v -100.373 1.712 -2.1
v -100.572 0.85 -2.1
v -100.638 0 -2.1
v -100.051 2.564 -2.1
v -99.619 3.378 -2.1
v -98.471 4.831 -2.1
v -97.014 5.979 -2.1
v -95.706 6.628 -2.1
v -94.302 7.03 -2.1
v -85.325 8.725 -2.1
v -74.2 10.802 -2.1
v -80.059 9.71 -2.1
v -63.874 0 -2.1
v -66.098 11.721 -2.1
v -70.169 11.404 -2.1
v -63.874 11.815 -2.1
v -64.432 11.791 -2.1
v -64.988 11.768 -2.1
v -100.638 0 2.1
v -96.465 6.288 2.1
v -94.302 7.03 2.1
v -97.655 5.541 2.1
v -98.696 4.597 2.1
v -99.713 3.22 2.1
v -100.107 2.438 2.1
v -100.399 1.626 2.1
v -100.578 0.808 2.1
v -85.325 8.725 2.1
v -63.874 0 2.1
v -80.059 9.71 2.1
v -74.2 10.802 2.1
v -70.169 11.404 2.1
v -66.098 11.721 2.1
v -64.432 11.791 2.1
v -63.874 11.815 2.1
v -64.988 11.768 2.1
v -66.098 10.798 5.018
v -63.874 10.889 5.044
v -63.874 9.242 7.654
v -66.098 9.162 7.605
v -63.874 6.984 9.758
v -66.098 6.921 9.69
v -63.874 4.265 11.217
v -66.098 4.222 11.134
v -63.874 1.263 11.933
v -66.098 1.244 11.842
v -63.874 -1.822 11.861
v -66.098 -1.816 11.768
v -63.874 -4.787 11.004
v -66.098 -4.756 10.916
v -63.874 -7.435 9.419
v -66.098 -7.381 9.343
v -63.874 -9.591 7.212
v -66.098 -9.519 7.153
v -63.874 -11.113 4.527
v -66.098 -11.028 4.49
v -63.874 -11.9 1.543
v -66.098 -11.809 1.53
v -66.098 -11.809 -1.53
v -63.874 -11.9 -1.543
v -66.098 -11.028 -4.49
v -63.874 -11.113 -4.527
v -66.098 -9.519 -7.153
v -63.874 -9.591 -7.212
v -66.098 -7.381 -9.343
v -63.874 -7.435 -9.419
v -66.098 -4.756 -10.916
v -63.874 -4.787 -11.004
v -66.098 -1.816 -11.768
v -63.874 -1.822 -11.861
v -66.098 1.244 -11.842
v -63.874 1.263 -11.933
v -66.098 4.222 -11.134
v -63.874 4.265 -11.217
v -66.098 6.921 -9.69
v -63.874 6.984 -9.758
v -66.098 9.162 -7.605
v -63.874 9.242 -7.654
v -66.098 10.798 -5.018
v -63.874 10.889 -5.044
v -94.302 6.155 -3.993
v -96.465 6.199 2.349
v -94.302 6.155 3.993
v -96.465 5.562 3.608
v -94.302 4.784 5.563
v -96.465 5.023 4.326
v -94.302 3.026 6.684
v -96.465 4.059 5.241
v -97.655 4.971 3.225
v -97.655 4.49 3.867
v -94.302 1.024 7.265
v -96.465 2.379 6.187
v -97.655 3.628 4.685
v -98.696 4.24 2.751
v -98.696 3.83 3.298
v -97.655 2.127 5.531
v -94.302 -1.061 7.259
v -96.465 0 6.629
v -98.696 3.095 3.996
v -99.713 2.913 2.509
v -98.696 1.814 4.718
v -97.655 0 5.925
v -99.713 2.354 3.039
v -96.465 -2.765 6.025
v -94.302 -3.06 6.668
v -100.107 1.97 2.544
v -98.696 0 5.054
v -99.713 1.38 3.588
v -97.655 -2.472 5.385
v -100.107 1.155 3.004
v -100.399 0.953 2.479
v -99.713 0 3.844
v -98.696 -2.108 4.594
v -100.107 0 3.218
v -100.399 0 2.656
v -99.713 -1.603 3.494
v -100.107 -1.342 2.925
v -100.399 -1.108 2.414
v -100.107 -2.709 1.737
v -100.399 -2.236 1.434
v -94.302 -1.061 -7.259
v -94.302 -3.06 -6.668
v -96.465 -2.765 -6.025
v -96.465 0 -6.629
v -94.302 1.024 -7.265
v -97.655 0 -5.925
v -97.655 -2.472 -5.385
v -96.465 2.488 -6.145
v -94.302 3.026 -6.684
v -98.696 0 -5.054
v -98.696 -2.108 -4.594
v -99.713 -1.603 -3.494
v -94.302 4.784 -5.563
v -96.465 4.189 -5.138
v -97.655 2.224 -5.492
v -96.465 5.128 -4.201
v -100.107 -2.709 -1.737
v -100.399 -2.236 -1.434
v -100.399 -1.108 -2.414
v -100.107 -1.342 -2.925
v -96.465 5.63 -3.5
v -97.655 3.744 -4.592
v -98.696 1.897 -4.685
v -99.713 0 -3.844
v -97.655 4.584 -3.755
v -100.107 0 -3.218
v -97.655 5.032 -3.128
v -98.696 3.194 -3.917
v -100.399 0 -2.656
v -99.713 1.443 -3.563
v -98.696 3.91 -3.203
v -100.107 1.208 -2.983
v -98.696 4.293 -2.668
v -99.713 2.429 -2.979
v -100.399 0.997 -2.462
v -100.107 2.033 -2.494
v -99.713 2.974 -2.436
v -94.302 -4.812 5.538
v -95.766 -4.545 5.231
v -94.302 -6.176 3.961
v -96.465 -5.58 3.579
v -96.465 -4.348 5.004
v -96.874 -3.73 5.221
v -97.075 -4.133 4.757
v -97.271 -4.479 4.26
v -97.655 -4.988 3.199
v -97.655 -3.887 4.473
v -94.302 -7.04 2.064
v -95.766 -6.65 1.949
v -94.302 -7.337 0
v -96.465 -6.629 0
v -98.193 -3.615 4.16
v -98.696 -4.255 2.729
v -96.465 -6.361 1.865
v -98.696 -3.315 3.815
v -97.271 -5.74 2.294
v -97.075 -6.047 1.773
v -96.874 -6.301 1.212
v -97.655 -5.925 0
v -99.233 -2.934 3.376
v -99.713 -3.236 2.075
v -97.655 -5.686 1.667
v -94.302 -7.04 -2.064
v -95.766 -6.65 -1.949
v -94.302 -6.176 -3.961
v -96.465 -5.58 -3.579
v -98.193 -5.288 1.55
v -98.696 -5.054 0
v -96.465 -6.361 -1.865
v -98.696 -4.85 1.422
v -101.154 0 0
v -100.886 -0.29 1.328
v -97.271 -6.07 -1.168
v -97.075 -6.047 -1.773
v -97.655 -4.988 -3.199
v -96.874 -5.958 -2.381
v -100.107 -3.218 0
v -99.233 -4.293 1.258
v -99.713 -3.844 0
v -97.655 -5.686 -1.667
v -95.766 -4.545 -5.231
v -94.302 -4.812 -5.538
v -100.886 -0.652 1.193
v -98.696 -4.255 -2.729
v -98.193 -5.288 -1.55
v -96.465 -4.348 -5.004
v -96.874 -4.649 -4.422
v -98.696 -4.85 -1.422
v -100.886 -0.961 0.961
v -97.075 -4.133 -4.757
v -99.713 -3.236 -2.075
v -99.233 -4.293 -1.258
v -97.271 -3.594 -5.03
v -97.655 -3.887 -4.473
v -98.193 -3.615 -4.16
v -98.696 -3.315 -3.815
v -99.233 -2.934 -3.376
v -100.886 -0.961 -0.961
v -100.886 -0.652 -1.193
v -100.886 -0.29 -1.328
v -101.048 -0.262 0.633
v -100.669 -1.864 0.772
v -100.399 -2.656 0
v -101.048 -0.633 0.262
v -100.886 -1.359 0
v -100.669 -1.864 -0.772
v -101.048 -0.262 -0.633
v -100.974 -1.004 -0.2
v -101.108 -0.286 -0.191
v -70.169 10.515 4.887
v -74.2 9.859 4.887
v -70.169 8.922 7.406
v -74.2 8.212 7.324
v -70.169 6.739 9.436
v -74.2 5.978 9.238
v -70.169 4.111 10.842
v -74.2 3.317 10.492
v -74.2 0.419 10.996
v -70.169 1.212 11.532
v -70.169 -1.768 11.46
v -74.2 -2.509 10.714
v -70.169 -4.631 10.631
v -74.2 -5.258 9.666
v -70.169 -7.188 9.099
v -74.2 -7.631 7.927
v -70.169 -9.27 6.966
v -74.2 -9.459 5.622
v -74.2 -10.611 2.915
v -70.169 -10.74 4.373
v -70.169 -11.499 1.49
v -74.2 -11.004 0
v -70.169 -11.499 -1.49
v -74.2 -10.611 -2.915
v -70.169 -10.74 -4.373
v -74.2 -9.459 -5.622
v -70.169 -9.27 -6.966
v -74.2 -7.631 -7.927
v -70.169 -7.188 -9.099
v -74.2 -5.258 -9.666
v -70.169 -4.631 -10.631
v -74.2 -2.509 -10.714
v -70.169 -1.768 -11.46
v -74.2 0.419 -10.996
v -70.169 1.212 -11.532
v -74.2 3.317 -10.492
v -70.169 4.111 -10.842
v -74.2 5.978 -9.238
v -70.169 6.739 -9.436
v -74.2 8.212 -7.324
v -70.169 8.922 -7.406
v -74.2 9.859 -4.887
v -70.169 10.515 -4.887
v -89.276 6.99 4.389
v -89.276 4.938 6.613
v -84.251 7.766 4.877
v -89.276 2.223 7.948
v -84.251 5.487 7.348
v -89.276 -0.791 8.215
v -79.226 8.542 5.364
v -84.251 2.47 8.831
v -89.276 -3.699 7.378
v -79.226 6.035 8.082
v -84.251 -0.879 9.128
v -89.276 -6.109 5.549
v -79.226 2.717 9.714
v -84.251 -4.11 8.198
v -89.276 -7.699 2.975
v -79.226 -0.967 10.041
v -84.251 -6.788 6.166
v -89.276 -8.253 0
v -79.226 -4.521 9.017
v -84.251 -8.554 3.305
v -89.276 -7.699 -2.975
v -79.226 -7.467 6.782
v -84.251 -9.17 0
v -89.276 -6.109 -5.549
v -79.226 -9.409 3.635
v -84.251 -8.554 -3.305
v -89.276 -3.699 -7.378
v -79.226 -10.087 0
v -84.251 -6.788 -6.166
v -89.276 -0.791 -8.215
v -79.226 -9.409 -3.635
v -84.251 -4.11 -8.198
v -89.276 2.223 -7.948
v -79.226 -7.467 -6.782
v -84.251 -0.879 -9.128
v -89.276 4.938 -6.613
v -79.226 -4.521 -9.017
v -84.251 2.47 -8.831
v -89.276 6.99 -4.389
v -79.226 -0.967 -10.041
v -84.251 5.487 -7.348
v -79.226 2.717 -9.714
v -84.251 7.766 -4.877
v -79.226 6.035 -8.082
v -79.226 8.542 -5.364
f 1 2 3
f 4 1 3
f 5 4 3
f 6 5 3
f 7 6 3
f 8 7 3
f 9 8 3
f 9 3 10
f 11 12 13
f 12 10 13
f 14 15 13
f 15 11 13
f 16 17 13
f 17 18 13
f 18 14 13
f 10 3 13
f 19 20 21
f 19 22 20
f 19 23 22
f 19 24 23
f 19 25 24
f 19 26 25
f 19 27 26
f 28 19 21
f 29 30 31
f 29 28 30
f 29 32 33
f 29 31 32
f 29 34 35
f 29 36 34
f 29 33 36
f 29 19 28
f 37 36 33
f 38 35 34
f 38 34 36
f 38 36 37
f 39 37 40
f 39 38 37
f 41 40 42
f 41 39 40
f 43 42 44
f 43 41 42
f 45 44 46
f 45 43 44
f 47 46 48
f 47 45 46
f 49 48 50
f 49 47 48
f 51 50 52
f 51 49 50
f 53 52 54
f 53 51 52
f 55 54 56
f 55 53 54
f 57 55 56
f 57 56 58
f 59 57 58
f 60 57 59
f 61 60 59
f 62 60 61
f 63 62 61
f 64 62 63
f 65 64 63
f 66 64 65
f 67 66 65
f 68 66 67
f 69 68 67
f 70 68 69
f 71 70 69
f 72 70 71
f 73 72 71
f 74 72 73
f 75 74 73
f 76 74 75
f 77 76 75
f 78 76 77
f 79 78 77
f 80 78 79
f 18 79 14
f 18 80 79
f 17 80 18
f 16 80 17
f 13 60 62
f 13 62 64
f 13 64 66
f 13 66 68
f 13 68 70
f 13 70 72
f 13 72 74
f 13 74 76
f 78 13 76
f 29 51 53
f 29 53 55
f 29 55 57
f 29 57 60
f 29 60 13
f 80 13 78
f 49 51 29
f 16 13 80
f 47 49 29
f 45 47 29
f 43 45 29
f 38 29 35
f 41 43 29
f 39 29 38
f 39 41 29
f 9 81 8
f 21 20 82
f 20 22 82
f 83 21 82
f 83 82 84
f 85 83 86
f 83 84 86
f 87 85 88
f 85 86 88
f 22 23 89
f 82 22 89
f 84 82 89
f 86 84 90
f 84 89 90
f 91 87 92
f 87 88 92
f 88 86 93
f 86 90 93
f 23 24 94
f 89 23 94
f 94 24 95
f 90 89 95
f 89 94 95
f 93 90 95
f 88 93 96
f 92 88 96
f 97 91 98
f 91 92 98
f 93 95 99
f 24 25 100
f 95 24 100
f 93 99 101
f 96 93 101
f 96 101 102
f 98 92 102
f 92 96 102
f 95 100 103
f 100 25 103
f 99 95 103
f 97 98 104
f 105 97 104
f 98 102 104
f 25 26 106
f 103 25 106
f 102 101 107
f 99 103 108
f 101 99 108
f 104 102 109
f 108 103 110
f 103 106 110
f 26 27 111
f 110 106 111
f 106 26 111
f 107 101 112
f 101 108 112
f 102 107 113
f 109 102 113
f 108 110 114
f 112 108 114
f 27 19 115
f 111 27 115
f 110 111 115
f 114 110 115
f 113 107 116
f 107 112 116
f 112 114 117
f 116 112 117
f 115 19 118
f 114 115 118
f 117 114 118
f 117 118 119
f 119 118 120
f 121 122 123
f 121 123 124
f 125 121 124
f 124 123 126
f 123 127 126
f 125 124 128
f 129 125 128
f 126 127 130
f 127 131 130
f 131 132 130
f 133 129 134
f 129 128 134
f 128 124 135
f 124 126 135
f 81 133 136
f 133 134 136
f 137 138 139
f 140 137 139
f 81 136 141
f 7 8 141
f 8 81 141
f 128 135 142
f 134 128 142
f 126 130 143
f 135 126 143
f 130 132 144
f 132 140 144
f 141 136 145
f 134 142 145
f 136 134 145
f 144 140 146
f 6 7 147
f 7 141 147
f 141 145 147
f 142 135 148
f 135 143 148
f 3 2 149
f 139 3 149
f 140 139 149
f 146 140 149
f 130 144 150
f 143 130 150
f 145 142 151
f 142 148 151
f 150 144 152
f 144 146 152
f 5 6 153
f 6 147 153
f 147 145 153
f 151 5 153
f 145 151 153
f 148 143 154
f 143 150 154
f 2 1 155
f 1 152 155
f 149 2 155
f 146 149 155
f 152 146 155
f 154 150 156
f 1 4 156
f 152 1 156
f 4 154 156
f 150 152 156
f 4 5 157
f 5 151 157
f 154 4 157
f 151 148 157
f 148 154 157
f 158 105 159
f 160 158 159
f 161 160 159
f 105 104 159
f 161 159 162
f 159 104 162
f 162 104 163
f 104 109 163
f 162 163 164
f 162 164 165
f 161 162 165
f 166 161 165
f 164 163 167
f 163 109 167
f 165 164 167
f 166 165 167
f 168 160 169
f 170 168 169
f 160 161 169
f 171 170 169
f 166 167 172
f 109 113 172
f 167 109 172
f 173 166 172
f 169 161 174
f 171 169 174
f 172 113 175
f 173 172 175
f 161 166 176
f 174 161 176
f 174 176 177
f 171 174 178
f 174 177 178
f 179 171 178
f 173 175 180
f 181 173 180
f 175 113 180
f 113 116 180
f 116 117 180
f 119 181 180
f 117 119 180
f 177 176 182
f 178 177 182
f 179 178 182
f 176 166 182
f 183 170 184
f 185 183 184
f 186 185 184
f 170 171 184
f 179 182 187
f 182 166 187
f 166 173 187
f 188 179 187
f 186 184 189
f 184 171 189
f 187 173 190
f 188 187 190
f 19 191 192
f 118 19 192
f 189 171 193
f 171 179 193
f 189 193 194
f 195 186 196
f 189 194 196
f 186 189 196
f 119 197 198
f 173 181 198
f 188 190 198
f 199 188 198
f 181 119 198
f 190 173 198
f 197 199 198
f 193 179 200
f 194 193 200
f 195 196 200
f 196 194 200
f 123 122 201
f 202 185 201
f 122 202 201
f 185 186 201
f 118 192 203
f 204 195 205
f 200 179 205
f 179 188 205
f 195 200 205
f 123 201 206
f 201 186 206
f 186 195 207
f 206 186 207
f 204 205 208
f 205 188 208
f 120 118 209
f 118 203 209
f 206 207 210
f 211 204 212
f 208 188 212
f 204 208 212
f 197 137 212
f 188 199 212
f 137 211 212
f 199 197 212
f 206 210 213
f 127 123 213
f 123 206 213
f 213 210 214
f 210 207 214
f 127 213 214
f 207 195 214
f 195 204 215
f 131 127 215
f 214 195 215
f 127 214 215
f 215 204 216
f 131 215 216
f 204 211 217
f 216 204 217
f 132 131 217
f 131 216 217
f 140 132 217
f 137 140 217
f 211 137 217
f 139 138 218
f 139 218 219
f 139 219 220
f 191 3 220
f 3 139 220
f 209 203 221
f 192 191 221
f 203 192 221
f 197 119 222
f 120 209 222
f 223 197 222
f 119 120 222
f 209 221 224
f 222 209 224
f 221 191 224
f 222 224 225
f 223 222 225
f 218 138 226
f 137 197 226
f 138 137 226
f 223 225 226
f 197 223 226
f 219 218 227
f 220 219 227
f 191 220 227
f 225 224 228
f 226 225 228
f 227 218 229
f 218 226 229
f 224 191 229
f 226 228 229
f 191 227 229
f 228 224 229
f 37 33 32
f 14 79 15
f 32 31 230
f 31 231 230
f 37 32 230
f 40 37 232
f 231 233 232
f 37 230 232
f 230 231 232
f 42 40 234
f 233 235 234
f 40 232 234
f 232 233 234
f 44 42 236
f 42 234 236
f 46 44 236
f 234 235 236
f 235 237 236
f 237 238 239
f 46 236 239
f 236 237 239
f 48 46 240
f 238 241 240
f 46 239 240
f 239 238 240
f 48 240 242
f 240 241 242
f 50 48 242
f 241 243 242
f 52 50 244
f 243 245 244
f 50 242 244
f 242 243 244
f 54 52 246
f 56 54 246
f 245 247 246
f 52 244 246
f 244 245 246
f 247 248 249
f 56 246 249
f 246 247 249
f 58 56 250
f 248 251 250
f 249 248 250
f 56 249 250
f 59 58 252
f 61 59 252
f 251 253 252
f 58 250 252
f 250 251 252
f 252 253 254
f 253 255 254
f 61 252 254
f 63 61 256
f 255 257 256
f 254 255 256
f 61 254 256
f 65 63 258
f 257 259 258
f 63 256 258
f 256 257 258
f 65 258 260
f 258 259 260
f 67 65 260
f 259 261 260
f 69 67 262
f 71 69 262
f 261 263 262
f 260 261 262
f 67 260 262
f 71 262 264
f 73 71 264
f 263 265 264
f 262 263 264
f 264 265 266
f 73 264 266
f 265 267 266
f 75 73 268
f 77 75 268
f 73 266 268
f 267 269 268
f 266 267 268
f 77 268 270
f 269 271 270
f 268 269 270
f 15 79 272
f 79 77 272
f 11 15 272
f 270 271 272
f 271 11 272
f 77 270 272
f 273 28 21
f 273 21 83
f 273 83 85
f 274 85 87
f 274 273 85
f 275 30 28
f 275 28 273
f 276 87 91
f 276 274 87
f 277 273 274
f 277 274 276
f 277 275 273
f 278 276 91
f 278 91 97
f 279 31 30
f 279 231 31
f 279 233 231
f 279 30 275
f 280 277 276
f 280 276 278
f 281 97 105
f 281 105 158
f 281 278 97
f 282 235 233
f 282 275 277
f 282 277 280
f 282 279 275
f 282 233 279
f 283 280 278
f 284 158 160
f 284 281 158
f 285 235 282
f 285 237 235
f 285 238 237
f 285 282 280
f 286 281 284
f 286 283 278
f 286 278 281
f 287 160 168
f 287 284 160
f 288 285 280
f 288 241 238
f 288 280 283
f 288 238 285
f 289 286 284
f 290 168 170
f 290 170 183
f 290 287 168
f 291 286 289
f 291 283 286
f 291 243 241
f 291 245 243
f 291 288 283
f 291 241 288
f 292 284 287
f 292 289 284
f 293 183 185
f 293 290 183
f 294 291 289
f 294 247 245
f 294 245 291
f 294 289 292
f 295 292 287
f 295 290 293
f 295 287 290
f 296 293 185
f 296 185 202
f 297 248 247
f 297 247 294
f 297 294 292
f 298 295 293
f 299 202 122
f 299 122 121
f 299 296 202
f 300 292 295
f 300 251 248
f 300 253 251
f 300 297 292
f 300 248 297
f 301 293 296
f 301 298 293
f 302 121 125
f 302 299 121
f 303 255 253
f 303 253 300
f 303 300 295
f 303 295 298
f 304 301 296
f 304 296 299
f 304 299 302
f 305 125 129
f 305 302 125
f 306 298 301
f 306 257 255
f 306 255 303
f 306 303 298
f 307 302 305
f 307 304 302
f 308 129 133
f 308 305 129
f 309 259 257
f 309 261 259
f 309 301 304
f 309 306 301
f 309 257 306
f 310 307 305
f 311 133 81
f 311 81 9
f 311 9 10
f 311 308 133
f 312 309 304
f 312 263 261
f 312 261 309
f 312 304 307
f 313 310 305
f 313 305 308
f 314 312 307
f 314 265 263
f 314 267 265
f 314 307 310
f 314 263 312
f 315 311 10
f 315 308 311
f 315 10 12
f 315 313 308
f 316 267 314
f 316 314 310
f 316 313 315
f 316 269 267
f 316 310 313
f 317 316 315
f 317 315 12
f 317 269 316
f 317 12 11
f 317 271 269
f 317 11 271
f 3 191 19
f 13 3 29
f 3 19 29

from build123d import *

# Parameters (mm, degrees)
SKETCH001_W  = 85.039572
SKETCH001_H  = 4.2
POCKET_DEPTH = 20


with BuildPart() as part:
    # CopyCopySketch004 → Revolution (revolve)
    with BuildSketch(Plane.XY):
        with BuildLine():
            Line((-94.301748, 7.336546), (-74.200088, 11.003772))
            ThreePointArc((-66.09792, 11.907295), (-70.164685, 11.596147), (-74.200088, 11.003772))
            Line((-66.09792, 11.907295), (-63.874209, 12))
            Line((-63.874209, 12), (-63.874209, 0))
            Line((-63.874209, 0), (-101.154209, 0))
            ThreePointArc((-94.301748, 7.336546), (-98.941677, 4.801888), (-101.154209, 0))
        make_face()
    revolve(axis=Axis((0, 0, 0), (1, 0, 0)))

    # Sketch001 → Pocket (cut)
    with BuildSketch(Plane.XZ):
        with Locations((-60.179326, 0)):
            Rectangle(SKETCH001_W, SKETCH001_H)
    extrude(amount=-POCKET_DEPTH, mode=Mode.SUBTRACT)


solid = part.part
